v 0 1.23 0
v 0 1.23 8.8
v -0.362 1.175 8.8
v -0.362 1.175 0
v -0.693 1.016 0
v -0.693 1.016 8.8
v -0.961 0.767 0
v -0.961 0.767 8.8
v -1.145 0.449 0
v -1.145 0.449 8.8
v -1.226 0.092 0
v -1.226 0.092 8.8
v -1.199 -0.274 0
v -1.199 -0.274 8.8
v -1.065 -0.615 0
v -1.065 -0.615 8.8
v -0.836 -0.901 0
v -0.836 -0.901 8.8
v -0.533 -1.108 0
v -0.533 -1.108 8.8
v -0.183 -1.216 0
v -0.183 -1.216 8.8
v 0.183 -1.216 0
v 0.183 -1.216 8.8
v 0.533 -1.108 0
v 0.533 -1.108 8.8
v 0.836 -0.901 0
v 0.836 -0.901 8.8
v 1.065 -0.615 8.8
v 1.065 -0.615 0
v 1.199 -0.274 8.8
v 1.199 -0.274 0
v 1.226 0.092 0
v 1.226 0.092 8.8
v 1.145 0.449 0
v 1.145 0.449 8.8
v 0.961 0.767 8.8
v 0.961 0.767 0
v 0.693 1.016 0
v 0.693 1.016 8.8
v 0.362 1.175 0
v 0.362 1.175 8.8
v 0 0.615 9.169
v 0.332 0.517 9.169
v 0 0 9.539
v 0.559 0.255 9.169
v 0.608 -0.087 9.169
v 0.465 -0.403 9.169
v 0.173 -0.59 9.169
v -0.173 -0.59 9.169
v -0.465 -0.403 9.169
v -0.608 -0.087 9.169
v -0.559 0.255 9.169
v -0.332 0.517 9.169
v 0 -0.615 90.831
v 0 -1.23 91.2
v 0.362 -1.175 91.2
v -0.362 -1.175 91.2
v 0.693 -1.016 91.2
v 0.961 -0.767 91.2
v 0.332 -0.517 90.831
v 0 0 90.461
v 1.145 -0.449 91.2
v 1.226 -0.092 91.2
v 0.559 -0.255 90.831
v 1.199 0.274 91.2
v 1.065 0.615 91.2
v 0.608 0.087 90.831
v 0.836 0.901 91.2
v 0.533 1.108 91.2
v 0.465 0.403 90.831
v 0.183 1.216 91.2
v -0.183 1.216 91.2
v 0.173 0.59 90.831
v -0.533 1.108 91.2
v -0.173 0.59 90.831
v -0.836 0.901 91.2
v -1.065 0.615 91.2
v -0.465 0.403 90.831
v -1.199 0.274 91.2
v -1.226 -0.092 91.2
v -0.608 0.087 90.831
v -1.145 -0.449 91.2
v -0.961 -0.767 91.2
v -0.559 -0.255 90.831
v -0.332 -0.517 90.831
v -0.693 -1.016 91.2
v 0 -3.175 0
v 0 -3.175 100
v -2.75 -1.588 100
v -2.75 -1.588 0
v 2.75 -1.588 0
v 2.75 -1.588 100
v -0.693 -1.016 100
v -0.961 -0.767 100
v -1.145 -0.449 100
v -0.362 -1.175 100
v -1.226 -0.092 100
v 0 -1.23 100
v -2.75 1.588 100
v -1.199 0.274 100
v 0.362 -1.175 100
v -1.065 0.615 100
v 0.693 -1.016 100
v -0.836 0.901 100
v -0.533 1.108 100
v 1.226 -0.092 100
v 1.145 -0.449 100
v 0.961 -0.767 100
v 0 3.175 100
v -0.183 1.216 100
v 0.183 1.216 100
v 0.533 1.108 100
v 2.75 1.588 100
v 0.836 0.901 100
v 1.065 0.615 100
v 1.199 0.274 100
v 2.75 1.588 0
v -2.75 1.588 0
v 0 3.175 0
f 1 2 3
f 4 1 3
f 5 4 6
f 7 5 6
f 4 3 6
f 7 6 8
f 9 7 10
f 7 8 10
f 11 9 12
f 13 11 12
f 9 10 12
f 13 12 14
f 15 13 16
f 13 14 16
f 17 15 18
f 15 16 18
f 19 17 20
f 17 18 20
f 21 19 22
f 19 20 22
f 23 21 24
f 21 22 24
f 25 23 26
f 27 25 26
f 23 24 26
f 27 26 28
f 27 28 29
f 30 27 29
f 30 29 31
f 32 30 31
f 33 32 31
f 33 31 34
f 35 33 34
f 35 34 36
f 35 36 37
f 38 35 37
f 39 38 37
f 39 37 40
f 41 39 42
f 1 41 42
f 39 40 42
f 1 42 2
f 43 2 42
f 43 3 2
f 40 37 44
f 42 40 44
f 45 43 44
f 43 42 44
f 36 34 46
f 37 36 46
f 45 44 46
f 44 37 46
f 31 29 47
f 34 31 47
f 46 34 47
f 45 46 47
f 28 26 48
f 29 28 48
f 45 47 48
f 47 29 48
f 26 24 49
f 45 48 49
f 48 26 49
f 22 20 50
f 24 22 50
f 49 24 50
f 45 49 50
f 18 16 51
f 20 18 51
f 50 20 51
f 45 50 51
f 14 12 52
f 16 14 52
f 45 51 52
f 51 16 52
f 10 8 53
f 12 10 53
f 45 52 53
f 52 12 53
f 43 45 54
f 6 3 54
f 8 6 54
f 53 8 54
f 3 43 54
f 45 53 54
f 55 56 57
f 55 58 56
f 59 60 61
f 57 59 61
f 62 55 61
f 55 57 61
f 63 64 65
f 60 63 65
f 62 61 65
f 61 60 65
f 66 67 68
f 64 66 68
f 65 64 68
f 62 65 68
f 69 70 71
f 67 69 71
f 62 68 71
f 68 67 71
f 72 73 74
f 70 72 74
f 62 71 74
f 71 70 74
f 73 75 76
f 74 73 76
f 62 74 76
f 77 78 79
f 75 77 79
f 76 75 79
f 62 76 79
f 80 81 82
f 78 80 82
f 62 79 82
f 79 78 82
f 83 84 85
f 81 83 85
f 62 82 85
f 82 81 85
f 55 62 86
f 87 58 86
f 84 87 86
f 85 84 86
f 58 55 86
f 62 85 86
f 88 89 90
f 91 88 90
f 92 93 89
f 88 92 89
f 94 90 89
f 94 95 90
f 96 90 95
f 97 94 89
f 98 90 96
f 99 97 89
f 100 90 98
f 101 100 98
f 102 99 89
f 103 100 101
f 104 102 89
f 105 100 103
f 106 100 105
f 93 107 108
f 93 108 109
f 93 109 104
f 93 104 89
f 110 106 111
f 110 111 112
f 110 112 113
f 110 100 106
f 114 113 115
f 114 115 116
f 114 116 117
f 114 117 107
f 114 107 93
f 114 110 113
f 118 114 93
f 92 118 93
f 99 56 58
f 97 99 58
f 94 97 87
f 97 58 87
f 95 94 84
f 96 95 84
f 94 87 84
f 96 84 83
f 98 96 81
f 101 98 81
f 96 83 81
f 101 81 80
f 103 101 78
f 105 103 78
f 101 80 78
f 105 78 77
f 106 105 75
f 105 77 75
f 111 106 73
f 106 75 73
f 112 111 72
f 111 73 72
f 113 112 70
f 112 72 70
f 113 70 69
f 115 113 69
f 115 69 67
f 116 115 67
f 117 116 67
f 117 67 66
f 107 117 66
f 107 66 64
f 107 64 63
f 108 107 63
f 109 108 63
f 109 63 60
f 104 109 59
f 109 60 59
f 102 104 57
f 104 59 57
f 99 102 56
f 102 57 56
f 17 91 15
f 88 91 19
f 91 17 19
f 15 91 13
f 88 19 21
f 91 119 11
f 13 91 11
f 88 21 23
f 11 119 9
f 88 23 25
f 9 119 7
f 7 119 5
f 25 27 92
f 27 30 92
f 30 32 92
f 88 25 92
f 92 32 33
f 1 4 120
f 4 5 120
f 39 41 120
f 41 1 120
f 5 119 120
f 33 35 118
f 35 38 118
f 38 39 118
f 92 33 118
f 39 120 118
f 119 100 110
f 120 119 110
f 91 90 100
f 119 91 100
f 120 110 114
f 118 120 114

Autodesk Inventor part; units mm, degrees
ref_plane "YZ Plane" through (0, 0, 0) normal (1, 0, 0) x (0, 1, 0)
ref_plane "XZ Plane" through (0, 0, 0) normal (0, 1, 0) x (-1, 0, 0)
ref_plane "XY Plane" through (0, 0, 0) normal (0, 0, 1) x (1, 0, 0)
sketch "スケッチ1" plane through (0, 0, 0) normal (0, 0, 1) x (1, 0, 0)
  line L0 (0, 3.1754) -> (2.75, 1.5877)
  line L1 (2.75, 1.5877) -> (2.75, -1.5877)
  line L2 (2.75, -1.5877) -> (0, -3.1754)
  line L3 (0, -3.1754) -> (-2.75, -1.5877)
  line L4 (-2.75, -1.5877) -> (-2.75, 1.5877)
  line L5 (-2.75, 1.5877) -> (0, 3.1754)
  point P0 (0, 0)
  point P1 (0, 0)
  dimension "d0" = 5.5
extrude "押し出し1" add sketch "スケッチ1" along normal blind 100
sketch "スケッチ2" plane through (0, 0, 100) normal (0, 0, 1) x (1, 0, 0)
  point P0 (0, 0)
hole "穴1" at (0, 0, 100) direction (0, 0, -1) diameter 2.459 depth 8.8 tip angle 118 thread size "M3x0.5" class "6H" standard "ISO Metric profile"
sketch "スケッチ3" plane through (0, 0, 0) normal (0, 0, -1) x (-1, 0, 0)
  point P0 (0, 0)
hole "穴2" at (0, 0, 0) direction (0, 0, 1) diameter 2.459 depth 8.8 tip angle 118 thread size "M3x0.5" class "6H" standard "ISO Metric profile"
properties part number "アルミスペーサー(六角・酸洗処理）_ASL-3100E" material "アルミニウム 6061"
